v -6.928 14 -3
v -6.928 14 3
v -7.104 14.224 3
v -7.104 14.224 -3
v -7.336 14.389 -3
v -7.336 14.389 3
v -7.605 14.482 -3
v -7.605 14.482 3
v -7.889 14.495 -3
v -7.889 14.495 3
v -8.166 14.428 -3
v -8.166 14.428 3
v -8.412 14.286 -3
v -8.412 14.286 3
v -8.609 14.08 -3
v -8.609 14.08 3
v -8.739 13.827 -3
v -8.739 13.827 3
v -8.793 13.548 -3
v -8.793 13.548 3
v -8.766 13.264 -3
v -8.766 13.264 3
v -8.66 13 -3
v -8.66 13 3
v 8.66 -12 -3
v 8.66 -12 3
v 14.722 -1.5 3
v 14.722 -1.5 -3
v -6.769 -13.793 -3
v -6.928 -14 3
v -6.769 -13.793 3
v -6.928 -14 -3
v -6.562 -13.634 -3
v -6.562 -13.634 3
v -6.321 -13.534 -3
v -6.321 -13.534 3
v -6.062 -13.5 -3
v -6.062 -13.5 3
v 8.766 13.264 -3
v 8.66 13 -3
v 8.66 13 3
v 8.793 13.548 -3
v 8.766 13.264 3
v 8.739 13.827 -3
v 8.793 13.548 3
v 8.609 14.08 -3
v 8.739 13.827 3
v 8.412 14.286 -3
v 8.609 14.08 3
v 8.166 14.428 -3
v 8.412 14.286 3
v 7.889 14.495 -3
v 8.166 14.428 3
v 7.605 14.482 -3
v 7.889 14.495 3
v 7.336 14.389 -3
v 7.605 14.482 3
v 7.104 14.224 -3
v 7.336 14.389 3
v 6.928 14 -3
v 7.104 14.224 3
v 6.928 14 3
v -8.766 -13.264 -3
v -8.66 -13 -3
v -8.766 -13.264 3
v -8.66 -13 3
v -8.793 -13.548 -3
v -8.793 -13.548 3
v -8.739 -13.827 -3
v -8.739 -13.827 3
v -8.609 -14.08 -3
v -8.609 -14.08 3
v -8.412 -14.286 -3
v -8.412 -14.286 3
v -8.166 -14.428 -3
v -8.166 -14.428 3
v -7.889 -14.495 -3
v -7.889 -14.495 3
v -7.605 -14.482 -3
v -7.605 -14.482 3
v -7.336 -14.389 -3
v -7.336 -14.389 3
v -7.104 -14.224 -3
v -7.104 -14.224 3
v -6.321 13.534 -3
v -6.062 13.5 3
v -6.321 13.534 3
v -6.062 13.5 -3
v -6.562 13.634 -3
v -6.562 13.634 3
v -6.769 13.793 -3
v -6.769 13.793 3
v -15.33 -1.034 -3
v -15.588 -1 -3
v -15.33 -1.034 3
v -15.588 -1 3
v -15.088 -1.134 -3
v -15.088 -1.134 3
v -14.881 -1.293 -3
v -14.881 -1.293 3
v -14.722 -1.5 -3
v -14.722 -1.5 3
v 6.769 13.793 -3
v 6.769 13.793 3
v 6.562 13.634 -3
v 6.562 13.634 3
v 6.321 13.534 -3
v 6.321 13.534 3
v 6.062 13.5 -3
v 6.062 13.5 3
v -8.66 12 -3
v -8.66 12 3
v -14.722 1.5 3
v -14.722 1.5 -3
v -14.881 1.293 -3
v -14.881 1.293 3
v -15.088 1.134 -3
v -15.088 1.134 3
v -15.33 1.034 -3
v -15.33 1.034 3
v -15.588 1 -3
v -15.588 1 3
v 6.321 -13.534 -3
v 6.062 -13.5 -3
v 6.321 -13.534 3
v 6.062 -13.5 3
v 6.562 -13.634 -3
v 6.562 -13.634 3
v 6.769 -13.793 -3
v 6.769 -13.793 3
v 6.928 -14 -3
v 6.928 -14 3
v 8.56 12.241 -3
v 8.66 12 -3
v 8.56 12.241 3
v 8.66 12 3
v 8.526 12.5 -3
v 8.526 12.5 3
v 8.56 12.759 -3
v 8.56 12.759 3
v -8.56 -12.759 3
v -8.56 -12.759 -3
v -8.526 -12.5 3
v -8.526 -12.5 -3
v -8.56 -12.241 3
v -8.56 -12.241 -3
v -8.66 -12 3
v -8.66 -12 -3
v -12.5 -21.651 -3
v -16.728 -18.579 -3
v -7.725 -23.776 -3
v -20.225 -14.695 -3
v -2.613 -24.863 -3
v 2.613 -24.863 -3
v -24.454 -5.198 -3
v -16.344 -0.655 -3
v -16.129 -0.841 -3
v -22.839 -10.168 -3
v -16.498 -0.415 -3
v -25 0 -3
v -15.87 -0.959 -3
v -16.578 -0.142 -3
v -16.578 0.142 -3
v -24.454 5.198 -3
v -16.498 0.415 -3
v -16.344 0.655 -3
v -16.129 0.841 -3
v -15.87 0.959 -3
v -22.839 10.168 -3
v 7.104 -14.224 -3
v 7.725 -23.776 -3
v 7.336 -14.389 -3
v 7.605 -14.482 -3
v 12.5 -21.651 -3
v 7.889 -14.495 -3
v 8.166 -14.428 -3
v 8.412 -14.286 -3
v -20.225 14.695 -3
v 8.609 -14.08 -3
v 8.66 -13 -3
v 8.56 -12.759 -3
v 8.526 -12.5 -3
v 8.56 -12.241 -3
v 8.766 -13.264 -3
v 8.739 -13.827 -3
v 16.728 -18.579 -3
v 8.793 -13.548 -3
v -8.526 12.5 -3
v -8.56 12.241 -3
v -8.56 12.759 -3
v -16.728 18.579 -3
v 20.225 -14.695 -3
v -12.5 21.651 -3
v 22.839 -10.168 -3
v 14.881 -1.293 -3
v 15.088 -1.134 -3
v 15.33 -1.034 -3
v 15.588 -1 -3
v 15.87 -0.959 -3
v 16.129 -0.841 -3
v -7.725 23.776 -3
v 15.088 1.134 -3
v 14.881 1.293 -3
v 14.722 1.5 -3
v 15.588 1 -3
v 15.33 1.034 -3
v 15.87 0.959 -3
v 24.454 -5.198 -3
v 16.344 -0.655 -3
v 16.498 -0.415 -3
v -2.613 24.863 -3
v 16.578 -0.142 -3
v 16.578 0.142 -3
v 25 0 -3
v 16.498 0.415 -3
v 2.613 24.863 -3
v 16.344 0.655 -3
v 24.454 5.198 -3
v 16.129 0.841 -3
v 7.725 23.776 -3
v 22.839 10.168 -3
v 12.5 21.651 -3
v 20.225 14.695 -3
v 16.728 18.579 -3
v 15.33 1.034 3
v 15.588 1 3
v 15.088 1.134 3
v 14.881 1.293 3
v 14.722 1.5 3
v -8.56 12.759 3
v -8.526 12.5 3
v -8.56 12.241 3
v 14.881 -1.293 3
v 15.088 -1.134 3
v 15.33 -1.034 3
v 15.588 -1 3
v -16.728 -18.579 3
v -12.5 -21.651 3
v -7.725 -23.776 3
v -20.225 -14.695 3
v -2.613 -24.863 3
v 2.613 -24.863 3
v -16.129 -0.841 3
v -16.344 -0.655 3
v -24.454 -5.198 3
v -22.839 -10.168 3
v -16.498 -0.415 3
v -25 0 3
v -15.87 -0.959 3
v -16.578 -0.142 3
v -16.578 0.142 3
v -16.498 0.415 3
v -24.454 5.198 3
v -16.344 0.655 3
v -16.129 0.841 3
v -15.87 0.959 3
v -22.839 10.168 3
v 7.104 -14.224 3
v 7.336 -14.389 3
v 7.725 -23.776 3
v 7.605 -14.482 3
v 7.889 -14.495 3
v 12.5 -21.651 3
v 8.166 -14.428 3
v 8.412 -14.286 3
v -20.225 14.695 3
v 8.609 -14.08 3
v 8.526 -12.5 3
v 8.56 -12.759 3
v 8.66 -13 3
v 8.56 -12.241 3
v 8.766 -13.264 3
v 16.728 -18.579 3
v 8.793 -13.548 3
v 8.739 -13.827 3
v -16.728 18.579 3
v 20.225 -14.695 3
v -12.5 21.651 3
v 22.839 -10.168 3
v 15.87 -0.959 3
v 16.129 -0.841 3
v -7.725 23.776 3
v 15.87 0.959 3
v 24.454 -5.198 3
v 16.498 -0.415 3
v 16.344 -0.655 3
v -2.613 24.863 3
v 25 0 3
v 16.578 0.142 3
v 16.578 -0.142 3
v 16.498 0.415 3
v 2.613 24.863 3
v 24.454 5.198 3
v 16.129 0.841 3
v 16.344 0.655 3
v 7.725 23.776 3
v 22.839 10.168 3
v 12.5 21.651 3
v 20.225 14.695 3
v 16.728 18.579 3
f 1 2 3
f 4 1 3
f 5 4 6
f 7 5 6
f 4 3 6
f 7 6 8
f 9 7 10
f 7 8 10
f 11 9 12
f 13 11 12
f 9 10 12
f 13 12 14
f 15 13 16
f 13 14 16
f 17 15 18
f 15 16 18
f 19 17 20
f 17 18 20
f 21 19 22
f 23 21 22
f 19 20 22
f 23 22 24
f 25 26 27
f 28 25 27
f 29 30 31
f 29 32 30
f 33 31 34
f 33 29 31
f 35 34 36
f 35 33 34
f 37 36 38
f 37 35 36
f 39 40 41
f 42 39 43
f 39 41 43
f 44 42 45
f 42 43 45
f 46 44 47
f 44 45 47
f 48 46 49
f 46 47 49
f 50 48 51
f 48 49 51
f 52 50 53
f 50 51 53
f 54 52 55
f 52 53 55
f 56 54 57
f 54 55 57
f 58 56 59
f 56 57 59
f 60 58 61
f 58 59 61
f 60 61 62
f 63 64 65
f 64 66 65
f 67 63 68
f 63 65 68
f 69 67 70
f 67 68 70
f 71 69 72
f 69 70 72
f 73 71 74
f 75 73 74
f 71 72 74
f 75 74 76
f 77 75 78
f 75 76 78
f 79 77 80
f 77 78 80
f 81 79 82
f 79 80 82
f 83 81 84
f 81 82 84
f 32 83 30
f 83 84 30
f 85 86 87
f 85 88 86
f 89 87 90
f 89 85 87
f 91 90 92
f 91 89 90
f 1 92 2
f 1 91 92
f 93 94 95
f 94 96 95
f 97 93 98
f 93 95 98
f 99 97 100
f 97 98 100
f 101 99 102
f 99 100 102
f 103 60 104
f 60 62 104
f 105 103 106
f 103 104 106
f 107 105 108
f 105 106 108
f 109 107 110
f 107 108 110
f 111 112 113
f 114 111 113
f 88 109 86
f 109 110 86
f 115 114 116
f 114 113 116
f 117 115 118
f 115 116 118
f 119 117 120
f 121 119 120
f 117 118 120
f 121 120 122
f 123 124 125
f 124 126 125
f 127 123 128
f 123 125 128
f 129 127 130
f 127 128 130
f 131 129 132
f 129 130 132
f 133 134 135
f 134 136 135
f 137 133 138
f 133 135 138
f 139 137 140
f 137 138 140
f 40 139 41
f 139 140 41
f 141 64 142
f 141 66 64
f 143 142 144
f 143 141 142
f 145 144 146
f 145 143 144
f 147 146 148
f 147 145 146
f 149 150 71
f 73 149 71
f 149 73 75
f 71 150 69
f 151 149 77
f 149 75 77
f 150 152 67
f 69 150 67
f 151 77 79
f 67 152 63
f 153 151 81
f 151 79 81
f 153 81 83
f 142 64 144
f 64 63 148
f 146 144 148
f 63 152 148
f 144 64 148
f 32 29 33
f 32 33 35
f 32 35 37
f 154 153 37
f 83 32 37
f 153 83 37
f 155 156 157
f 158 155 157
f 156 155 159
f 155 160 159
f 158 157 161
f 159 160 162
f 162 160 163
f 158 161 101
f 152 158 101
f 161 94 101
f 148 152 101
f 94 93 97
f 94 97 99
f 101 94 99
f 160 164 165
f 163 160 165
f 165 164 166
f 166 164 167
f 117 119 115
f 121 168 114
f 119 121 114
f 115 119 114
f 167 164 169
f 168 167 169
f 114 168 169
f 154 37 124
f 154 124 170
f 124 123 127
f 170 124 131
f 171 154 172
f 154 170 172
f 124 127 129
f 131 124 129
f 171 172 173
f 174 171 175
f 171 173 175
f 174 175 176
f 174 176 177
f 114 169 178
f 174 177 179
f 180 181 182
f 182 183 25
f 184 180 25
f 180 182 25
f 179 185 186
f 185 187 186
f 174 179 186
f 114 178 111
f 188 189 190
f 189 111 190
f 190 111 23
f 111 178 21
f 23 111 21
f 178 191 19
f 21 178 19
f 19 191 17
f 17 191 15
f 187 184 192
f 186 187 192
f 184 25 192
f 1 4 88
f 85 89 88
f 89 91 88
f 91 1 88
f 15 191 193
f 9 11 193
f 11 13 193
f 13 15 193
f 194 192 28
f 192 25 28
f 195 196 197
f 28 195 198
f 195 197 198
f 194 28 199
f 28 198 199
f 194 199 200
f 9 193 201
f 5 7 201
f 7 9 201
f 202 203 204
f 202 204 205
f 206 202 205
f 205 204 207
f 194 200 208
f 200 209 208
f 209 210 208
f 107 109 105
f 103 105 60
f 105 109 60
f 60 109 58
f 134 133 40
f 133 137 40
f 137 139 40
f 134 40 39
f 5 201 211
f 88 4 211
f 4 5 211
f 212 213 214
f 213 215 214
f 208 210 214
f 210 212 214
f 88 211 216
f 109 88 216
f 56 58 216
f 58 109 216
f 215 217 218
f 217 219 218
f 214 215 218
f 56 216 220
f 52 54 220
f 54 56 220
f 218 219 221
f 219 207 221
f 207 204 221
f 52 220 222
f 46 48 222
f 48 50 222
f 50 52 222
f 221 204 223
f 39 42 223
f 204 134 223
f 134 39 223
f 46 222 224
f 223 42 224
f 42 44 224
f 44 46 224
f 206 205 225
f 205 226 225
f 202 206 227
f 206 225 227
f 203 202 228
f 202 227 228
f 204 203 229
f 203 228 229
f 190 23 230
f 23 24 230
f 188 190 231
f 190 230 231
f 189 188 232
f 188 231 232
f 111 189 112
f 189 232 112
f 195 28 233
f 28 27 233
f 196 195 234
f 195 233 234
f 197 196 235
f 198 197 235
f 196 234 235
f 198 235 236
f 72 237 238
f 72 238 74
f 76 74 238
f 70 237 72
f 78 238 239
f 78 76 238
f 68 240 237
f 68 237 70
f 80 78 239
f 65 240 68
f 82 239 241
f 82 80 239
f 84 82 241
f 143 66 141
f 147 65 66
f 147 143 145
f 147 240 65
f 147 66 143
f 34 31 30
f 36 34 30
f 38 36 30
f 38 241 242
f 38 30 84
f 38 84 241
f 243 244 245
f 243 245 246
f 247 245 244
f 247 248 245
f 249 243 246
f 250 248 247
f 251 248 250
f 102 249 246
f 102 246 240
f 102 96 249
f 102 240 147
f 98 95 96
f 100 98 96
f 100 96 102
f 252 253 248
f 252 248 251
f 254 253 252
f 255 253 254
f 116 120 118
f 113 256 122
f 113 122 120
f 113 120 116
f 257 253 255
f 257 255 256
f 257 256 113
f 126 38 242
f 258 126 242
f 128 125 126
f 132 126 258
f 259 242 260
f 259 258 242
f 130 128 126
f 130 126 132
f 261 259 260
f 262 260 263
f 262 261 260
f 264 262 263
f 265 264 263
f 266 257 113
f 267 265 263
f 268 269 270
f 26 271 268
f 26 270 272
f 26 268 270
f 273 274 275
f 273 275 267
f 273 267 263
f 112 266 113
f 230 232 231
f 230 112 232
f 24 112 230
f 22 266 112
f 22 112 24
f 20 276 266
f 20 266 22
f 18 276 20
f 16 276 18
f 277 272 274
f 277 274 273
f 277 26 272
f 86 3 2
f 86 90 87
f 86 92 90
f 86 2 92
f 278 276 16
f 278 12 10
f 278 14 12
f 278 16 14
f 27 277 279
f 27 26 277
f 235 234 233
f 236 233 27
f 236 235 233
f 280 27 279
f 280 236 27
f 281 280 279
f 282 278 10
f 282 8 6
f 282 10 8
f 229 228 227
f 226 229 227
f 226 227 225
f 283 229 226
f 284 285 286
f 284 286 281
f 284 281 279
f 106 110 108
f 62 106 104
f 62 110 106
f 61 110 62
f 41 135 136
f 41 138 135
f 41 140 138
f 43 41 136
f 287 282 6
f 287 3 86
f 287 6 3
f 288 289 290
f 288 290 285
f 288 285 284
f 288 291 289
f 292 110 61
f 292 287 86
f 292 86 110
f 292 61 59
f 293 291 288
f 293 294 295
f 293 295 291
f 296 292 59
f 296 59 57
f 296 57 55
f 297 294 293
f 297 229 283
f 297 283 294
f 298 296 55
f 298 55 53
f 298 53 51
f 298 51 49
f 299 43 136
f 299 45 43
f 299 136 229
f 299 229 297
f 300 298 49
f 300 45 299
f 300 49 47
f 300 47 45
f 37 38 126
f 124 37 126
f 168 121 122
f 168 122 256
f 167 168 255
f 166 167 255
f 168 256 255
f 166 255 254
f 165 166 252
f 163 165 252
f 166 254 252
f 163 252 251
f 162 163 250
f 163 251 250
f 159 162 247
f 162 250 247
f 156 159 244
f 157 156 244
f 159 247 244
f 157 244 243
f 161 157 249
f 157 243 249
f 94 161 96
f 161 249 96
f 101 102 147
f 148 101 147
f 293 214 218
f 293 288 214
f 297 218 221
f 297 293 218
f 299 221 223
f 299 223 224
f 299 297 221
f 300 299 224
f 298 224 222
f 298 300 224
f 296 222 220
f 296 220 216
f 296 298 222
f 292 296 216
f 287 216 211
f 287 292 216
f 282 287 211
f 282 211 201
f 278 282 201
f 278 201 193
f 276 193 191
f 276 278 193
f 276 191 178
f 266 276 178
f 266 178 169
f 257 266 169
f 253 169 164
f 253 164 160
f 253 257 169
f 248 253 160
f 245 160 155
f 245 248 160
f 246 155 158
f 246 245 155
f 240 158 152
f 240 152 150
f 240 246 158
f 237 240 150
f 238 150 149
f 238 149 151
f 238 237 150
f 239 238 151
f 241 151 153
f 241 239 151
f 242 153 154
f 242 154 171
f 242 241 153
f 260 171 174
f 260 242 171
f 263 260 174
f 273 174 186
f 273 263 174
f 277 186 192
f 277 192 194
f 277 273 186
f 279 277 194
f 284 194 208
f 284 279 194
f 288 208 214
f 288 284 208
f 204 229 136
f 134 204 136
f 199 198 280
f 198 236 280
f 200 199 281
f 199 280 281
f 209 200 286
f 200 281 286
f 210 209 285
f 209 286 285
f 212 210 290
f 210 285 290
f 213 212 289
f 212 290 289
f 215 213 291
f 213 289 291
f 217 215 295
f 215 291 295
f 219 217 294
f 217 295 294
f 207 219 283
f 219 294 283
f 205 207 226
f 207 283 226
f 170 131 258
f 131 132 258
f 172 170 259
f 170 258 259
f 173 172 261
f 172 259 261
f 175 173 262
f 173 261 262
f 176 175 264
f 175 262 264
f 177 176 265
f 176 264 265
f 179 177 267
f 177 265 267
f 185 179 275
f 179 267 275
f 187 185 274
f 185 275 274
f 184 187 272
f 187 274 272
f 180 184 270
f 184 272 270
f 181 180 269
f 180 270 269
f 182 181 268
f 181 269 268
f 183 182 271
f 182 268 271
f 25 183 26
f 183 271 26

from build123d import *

# Parameters (mm, degrees)
SKETCH1_R           = 25
BOSS_EXTRUDE1_DEPTH = 3
SKETCH2_R           = 1
CUT_EXTRUDE1_DEPTH  = 36.860842154
FILLET1_R           = 1


with BuildPart() as part:
    # Sketch1 → Boss-Extrude1 (new, symmetric)
    with BuildSketch(Plane.XY):
        Circle(SKETCH1_R)
        Polygon((-15.588457268, 0), (-7.794228634, -13.5), (7.794228634, -13.5), (15.588457268, 0), (7.794228634, 13.5), (-7.794228634, 13.5), align=None, mode=Mode.SUBTRACT)
    extrude(amount=BOSS_EXTRUDE1_DEPTH, both=True)

    # Sketch2 → Cut-Extrude1 (cut, through all)
    with BuildSketch(Plane.XY.offset(3)):
        with Locations((-7.794228634, 13.5)):
            Circle(SKETCH2_R)
        with Locations((7.794228634, 13.5)):
            Circle(SKETCH2_R)
        with Locations((-15.588457268, 0)):
            Circle(SKETCH2_R)
        with Locations((-7.794228634, -13.5)):
            Circle(SKETCH2_R)
        with Locations((7.794228634, -13.5)):
            Circle(SKETCH2_R)
        with Locations((15.588457268, 0)):
            Circle(SKETCH2_R)
    extrude(amount=-CUT_EXTRUDE1_DEPTH, mode=Mode.SUBTRACT)

    # Fillet1
    fillet1_edges = [part.edges().sort_by_distance(p)[0] for p in [
        (-6.794228634, 13.5, 0),
        (6.794228634, 13.5, 0),
        (15.088457268, 0.866025404, 0),
        (8.294228634, -12.633974596, 0),
        (-6.794228634, -13.5, 0),
        (-15.088457268, -0.866025404, 0),
        (15.088457268, -0.866025404, 0),
        (6.794228634, -13.5, 0),
        (-8.294228634, -12.633974596, 0),
        (-15.088457268, 0.866025404, 0),
        (8.294228634, 12.633974596, 0),
        (-8.294228634, 12.633974596, 0),
    ]]
    fillet(fillet1_edges, radius=FILLET1_R)


solid = part.part
